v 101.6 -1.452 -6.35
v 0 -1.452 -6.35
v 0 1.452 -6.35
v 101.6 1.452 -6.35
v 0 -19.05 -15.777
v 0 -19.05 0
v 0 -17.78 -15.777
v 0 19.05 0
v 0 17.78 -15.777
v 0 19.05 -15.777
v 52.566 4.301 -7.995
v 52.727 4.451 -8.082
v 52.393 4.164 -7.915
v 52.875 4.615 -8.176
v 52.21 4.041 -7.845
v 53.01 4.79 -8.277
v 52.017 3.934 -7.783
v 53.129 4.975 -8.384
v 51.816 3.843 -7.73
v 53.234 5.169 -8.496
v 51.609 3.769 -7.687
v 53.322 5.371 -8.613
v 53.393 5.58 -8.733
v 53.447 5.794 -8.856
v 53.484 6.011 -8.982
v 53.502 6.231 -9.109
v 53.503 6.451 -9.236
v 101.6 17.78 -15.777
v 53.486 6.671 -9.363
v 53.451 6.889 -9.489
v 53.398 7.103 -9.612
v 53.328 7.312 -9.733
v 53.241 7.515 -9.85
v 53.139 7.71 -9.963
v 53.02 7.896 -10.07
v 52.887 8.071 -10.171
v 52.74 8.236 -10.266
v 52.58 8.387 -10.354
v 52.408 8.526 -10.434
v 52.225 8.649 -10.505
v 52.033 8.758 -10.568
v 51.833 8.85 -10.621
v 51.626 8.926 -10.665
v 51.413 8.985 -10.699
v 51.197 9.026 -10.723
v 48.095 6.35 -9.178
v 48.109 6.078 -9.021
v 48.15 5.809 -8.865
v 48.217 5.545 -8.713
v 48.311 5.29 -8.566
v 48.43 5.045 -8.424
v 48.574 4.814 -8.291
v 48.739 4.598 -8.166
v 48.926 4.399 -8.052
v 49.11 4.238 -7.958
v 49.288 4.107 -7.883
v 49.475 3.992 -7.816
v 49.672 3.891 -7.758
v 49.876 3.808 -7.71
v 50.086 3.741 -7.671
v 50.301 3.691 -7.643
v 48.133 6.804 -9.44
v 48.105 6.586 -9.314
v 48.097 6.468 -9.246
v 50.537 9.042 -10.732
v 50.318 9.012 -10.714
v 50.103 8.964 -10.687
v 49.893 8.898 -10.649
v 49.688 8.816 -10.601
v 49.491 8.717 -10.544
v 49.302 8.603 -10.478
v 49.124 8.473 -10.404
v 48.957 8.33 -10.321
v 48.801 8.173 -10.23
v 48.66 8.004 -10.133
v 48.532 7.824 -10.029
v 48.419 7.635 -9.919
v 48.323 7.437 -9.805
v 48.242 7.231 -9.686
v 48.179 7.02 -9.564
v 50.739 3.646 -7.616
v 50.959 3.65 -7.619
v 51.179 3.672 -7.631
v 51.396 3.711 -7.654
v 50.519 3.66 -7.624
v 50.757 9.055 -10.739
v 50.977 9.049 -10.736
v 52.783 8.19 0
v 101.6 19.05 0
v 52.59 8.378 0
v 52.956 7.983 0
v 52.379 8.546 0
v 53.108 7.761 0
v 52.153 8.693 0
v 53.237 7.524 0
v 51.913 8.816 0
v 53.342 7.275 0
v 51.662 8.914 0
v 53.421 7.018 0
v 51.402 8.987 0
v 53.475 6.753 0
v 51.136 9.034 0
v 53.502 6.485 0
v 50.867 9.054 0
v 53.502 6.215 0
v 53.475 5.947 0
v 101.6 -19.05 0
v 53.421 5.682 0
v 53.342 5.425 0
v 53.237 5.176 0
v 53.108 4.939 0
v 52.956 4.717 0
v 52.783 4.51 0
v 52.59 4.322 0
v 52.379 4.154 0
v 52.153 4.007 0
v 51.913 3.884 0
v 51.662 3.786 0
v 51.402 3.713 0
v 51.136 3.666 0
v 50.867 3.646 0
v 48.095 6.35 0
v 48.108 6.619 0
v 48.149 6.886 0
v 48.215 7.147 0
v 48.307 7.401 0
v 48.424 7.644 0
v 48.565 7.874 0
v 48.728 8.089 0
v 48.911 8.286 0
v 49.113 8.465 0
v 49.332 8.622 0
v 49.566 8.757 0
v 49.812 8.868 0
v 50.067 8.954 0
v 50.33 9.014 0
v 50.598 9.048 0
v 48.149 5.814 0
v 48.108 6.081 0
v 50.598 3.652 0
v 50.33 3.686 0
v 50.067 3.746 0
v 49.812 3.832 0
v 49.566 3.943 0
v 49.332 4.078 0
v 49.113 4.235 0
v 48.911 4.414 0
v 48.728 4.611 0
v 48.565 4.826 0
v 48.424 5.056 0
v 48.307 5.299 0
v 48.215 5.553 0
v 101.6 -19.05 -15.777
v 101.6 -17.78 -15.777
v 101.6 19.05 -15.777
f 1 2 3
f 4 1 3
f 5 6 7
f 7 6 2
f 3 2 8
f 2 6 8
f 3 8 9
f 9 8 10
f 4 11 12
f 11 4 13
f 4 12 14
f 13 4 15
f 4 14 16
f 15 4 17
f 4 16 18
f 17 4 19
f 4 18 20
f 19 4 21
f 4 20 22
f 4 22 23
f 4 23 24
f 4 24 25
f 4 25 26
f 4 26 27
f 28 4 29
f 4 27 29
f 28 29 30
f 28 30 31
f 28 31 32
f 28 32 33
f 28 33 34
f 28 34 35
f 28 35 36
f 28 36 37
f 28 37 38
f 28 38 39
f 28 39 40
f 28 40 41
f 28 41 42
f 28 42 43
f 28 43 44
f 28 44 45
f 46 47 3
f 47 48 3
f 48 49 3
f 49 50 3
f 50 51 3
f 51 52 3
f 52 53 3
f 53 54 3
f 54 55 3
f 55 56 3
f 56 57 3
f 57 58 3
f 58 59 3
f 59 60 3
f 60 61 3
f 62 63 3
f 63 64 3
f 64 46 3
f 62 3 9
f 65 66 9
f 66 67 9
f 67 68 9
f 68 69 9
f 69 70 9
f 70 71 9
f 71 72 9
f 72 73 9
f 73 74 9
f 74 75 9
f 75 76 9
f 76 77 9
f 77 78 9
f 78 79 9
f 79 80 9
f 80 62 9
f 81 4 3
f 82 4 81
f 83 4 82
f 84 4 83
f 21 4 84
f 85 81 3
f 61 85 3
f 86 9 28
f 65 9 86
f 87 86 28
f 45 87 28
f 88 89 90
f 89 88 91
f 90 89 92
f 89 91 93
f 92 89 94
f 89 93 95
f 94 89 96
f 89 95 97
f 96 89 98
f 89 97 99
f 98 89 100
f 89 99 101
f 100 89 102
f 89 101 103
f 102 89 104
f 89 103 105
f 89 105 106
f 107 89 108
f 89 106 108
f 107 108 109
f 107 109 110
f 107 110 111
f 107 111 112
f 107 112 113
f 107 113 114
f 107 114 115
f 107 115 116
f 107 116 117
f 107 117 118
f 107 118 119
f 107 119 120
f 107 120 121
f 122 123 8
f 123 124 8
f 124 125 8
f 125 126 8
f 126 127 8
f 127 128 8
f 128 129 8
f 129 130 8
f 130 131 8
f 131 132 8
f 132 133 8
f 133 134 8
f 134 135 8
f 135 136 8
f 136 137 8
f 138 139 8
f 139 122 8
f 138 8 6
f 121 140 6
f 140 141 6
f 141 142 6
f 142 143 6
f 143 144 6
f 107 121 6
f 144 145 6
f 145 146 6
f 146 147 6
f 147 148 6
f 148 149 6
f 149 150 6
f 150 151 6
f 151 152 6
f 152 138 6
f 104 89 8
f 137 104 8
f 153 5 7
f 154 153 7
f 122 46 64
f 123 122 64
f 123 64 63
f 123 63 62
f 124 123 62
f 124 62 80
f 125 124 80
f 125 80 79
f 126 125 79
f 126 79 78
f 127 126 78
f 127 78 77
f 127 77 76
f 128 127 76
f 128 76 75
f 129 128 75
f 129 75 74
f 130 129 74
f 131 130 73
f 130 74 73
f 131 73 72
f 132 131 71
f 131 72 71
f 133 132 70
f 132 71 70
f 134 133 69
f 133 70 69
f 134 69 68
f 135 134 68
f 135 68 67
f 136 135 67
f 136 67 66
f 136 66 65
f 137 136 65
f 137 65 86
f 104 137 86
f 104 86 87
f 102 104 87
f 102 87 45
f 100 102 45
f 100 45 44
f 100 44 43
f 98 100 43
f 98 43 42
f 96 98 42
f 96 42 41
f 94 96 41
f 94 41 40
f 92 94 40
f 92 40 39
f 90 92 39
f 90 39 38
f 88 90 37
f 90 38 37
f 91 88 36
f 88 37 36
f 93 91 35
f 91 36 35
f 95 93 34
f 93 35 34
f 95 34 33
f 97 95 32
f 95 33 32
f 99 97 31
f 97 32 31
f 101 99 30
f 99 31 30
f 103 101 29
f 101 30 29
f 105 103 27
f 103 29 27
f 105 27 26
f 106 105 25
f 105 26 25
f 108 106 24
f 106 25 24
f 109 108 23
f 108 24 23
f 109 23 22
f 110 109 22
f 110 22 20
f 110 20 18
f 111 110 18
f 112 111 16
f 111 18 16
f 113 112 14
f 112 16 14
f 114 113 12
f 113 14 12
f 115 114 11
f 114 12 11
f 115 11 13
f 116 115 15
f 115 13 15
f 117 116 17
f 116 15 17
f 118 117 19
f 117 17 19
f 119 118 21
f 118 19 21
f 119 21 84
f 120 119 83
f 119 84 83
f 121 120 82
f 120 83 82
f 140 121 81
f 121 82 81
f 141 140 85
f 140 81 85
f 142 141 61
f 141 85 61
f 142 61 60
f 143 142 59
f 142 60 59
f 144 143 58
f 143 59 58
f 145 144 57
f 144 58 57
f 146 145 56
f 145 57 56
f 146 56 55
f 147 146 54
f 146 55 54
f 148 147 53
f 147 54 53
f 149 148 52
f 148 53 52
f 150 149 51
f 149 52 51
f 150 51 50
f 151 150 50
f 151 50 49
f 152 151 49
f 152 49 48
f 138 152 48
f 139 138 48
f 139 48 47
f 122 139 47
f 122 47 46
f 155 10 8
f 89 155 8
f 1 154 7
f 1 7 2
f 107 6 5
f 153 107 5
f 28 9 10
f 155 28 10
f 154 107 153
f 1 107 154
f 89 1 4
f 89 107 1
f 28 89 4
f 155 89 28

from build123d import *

# Parameters (mm, degrees)
BOSS_EXTRUDE1_DEPTH     = 101.6
F_1_4_28_TAPPED_HOLE1_D = 5.4102


with BuildPart() as part:
    # Sketch1 → Boss-Extrude1 (new body)
    with BuildSketch(Plane(origin=(0, 0, 0), x_dir=(0, 0, -1), z_dir=(1, 0, 0))):
        Polygon((0, 19.05), (0, -19.05), (15.776765158, -19.05), (15.776765158, -17.78), (6.35, -1.452363795), (6.35, 1.452363795), (15.776765158, 17.78), (15.776765158, 19.05), align=None)
    extrude(amount=BOSS_EXTRUDE1_DEPTH)

    # 1/4-28 Tapped Hole1 (through all)
    with Locations(Plane.XY):
        with Locations((50.8, 6.35)):
            Hole(F_1_4_28_TAPPED_HOLE1_D / 2)


solid = part.part
